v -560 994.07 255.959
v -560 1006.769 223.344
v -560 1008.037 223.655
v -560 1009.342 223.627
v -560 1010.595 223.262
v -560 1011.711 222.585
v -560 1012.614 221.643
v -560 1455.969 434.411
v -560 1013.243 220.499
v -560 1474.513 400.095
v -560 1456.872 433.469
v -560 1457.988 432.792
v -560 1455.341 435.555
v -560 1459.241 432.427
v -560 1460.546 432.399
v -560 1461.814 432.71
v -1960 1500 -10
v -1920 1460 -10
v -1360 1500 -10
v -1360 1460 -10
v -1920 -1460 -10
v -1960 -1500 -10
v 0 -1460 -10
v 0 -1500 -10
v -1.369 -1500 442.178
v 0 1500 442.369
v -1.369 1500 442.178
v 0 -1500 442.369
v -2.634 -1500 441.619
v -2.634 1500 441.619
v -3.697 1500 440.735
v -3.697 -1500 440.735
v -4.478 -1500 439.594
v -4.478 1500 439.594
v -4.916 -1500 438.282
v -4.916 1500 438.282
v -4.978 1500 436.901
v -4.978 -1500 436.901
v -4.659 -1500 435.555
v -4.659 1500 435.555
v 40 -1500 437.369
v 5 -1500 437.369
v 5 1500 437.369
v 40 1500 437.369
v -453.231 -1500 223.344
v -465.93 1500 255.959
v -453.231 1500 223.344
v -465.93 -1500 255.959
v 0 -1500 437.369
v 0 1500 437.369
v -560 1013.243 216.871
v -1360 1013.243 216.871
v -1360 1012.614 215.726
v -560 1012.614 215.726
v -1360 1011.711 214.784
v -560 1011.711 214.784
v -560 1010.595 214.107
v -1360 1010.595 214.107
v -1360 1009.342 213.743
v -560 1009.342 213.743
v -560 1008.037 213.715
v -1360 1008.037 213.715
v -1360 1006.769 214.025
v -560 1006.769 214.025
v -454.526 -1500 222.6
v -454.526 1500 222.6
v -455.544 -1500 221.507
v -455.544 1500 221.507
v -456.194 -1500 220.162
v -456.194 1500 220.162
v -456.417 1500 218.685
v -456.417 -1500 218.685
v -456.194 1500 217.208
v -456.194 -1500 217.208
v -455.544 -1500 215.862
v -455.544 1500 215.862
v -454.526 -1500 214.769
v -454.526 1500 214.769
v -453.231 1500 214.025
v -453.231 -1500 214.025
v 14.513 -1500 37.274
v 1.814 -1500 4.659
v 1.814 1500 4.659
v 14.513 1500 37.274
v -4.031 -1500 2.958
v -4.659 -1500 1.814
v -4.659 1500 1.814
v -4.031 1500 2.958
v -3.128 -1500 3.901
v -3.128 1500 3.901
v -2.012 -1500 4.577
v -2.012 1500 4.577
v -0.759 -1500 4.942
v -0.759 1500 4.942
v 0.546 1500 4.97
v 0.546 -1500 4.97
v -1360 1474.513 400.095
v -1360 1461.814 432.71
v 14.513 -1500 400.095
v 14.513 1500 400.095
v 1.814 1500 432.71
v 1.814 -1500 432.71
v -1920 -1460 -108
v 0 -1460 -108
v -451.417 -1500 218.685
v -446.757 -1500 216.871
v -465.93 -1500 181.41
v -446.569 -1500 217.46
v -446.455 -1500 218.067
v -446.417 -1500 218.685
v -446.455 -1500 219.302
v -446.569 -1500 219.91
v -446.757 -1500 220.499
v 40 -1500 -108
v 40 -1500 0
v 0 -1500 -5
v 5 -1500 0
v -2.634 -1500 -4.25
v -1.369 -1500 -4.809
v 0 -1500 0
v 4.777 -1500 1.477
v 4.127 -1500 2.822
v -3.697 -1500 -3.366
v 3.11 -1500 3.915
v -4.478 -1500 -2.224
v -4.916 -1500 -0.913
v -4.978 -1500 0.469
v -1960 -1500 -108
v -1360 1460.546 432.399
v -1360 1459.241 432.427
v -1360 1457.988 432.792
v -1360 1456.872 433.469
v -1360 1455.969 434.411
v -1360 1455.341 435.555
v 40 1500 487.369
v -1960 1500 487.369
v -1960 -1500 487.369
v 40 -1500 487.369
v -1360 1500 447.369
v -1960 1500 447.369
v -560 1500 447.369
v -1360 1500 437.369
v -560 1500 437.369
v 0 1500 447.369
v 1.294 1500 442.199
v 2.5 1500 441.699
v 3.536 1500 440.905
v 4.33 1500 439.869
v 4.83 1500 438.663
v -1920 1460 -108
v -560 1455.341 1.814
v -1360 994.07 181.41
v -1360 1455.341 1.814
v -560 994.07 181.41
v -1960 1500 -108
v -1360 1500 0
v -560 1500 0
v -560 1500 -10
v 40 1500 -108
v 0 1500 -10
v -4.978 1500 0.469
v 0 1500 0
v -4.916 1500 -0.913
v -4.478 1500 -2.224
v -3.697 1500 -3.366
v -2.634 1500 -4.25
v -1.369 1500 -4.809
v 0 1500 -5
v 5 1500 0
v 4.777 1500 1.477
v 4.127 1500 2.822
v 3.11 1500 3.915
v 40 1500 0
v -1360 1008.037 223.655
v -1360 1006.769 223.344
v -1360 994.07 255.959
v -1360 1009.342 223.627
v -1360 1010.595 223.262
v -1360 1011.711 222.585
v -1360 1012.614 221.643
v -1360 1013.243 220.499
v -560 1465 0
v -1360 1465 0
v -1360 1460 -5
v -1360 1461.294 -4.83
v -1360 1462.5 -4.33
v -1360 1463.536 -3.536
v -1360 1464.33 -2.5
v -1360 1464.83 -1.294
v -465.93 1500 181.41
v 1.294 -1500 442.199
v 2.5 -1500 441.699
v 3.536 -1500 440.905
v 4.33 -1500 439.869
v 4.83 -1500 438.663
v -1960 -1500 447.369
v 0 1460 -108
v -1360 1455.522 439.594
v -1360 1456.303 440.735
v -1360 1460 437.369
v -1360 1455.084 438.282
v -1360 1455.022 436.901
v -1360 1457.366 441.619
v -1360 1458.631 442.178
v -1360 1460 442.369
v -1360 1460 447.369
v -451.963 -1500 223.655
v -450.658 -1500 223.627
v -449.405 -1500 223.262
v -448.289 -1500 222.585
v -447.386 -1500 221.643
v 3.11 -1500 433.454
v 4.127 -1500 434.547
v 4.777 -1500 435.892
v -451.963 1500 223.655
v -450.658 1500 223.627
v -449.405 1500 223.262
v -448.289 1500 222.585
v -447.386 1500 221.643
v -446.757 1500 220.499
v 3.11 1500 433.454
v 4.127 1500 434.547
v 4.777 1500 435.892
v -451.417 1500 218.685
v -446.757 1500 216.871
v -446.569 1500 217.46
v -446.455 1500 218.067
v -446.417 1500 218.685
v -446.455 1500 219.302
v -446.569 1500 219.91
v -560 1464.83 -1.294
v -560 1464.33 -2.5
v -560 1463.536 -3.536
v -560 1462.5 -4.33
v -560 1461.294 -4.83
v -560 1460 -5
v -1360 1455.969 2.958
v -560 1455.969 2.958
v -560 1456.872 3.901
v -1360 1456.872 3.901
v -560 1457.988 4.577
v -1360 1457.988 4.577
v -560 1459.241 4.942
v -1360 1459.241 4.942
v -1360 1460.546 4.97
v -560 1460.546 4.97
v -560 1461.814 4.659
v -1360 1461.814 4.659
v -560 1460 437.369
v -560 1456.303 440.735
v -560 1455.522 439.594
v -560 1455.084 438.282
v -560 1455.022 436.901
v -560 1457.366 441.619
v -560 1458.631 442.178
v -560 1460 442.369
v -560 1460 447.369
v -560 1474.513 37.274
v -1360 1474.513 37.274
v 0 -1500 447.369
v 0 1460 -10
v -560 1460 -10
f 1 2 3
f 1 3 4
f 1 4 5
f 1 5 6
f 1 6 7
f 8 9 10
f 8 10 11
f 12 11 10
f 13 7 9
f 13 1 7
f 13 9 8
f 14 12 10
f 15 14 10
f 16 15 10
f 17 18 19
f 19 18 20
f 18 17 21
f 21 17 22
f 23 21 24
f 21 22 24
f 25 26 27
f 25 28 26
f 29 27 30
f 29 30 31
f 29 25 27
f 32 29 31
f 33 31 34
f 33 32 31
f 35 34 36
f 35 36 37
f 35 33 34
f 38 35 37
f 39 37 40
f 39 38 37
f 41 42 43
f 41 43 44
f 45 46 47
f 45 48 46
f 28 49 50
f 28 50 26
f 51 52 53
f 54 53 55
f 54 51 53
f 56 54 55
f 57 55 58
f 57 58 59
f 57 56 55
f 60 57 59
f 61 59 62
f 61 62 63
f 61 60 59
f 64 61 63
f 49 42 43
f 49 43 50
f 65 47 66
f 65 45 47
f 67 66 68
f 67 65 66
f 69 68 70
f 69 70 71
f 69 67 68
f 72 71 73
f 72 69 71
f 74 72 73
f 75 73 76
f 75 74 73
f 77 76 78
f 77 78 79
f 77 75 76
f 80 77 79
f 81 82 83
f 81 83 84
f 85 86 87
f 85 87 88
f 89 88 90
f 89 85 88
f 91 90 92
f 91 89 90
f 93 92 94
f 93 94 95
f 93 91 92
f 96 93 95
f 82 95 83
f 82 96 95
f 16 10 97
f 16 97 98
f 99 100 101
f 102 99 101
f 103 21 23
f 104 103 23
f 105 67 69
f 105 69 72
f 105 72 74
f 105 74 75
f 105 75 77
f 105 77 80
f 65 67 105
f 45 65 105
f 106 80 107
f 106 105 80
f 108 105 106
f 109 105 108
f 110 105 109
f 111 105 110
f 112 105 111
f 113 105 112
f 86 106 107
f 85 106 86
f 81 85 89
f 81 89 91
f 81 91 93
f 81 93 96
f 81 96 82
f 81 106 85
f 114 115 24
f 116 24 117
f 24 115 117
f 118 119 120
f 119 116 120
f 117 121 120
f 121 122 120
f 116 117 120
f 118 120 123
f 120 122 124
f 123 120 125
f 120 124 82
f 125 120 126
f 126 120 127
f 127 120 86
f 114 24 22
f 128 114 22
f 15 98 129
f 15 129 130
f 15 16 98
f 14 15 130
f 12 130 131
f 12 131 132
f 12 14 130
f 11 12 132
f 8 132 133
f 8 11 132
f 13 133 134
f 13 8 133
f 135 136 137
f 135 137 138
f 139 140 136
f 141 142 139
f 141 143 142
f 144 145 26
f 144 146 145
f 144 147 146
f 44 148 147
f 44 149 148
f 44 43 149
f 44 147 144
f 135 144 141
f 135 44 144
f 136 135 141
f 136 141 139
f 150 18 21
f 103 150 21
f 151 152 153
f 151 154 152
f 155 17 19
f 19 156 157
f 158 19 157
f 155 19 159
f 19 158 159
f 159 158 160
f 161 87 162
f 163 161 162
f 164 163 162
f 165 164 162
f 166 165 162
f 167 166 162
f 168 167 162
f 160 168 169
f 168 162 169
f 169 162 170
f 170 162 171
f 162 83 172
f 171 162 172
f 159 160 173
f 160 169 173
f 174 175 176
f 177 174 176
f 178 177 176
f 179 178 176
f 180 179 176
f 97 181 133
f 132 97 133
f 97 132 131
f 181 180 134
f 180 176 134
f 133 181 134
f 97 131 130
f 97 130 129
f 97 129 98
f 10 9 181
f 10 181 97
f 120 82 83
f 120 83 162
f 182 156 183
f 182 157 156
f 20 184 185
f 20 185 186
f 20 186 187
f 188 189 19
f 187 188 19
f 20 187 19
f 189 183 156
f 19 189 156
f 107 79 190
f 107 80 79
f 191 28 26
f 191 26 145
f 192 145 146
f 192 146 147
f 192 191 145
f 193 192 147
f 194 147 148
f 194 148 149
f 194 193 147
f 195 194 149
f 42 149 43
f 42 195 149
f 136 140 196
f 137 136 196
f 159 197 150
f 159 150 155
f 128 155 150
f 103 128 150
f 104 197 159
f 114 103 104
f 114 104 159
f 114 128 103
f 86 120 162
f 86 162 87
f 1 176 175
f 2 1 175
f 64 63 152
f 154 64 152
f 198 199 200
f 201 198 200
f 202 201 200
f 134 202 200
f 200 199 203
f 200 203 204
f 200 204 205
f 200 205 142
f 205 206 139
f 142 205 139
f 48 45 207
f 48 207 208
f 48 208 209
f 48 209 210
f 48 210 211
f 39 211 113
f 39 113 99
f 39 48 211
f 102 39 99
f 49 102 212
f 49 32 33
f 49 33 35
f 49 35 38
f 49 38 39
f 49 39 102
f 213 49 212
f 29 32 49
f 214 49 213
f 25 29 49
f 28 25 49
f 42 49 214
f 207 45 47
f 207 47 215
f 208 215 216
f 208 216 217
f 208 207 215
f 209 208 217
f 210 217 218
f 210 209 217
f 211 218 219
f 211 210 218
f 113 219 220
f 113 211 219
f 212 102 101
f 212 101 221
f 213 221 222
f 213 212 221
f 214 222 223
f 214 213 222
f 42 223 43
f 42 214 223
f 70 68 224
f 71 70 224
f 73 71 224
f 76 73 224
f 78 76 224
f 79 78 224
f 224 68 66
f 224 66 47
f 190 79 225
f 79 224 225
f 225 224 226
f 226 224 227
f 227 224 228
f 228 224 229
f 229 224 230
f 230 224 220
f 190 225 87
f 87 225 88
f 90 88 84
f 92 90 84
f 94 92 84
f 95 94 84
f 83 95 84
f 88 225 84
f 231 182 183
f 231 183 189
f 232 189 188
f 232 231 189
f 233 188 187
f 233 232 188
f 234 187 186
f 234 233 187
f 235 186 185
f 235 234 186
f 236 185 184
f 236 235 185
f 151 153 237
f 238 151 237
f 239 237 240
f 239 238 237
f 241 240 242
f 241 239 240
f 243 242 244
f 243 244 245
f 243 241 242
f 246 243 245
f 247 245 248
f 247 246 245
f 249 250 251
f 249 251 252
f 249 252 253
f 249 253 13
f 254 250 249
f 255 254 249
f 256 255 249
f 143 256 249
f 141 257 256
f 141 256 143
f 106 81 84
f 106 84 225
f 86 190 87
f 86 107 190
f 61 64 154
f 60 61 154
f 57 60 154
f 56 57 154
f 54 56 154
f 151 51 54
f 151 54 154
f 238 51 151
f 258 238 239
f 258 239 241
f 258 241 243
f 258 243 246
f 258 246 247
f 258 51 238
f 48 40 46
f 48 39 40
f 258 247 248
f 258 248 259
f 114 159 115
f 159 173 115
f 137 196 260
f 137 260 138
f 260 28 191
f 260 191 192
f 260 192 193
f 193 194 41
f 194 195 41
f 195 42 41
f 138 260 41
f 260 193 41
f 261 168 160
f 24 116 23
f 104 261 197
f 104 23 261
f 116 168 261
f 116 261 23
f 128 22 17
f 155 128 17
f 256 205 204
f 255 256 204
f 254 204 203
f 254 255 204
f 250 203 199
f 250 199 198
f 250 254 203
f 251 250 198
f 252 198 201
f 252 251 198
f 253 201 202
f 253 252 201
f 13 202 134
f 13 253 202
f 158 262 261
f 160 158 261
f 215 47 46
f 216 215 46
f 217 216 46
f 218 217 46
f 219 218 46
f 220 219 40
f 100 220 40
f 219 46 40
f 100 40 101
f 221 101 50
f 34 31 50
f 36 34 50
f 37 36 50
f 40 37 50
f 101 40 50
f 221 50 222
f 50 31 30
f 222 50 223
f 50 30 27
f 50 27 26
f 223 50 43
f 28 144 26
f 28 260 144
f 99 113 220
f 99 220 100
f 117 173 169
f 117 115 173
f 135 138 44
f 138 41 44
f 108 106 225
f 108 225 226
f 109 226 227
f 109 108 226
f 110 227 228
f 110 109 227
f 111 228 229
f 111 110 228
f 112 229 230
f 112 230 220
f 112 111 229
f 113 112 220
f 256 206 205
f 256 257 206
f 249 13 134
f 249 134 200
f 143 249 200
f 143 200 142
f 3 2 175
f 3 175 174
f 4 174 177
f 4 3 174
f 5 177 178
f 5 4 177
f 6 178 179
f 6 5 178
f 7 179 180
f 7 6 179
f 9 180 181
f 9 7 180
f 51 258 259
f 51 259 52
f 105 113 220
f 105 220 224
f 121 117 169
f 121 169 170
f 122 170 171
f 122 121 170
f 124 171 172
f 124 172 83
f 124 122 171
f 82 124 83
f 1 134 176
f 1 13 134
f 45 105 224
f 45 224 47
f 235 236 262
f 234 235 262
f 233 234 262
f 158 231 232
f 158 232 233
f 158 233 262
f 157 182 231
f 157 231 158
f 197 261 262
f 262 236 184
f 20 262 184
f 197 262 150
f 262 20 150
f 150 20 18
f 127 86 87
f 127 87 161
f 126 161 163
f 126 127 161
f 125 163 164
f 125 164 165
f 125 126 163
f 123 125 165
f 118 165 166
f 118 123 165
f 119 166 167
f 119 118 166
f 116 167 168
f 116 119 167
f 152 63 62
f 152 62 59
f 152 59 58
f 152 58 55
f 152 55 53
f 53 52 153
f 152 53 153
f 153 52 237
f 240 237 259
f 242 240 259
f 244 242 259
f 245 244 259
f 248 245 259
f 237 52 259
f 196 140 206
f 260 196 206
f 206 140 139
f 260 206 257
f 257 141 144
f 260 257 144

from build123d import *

# Parameters (mm, degrees)
F1_DEPTH = 1500
F2_W     = 1920
F2_H     = 2920
F3_DEPTH = 40
F5_DEPTH = 98
F9_DEPTH = 400


with BuildPart() as f1:
    # F0 (on Front) → F1 (new body, symmetric)
    with BuildSketch(Plane.XZ):
        with BuildLine():
            Line((0, 447.3692746821), (0, 442.3692746821))
            ThreePointArc((0, 442.3692746821), (3.5355339059, 440.904808588), (5, 437.3692746821))
            Line((5, 437.3692746821), (40, 437.3692746821))
            Line((40, 437.3692746821), (40, 447.3692746821))
            Line((40, 447.3692746821), (0, 447.3692746821))
        make_face()
    extrude(amount=F1_DEPTH, both=True)

    # F2 (on face) → F3 (join)
    with BuildSketch(Plane.XY.offset(447.3692746821)):
        Polygon((0, 1460), (0, 1500), (-1960, 1500), (-1960, -1500), (0, -1500), (0, -1460), (-1920, -1460), (-1920, 1460), align=None)
        Polygon((40, -1500), (40, 1500), (0, 1500), (0, 1460), (0, -1460), (0, -1500), align=None)
        with Locations((-960, 0)):
            Rectangle(F2_W, F2_H)
    extrude(amount=F3_DEPTH)



with BuildPart() as f1b:
    # F0 (on Front) → F1, piece 2 (new body, symmetric)
    with BuildSketch(Plane.XZ):
        with BuildLine():
            Line((-465.9295136291, 255.9589984314), (-453.2307942915, 223.3439324773))
            ThreePointArc((-453.2307942915, 223.3439324773), (-449.4048367078, 223.2620208926), (-446.7573963927, 220.4987401035))
            Line((-446.7573963927, 220.4987401035), (14.5128221001, 400.0949135917))
            Line((14.5128221001, 400.0949135917), (1.8141027625, 432.7099795458))
            ThreePointArc((1.8141027625, 432.7099795458), (-2.0118548213, 432.7918911305), (-4.6592951363, 435.5551719196))
            Line((-4.6592951363, 435.5551719196), (-465.9295136291, 255.9589984314))
        make_face()
        with BuildLine():
            Line((0, 437.3692746821), (1.8141027625, 432.7099795458))
            ThreePointArc((1.8141027625, 432.7099795458), (4.127378939, 434.5470870388), (5, 437.3692746821))
            Line((5, 437.3692746821), (0, 437.3692746821))
        make_face()
        with BuildLine():
            Line((0, 437.3692746821), (-4.6592951363, 435.5551719196))
            ThreePointArc((-4.6592951363, 435.5551719196), (-2.0118548213, 432.7918911305), (1.8141027625, 432.7099795458))
            Line((1.8141027625, 432.7099795458), (0, 437.3692746821))
        make_face()
        with BuildLine():
            ThreePointArc((0, 442.3692746821), (-4.127378939, 440.1914623253), (-4.6592951363, 435.5551719196))
            Line((-4.6592951363, 435.5551719196), (0, 437.3692746821))
            Line((0, 437.3692746821), (0, 442.3692746821))
        make_face()
    extrude(amount=F1_DEPTH, both=True)


with BuildPart() as f1c:
    # F0 (on Front) → F1, piece 3 (new body, symmetric)
    with BuildSketch(Plane.XZ):
        with BuildLine():
            Line((-465.9295136291, 181.4102762507), (-4.6592951363, 1.8141027625))
            ThreePointArc((-4.6592951363, 1.8141027625), (-2.0118548213, 4.5773835516), (1.8141027625, 4.6592951363))
            Line((1.8141027625, 4.6592951363), (14.5128221001, 37.2743610903))
            Line((14.5128221001, 37.2743610903), (-446.7573963927, 216.8705345785))
            ThreePointArc((-446.7573963927, 216.8705345785), (-449.4048367078, 214.1072537895), (-453.2307942915, 214.0253422047))
            Line((-453.2307942915, 214.0253422047), (-465.9295136291, 181.4102762507))
        make_face()
        with BuildLine():
            Line((-451.416691529, 218.684637341), (-453.2307942915, 214.0253422047))
            ThreePointArc((-453.2307942915, 214.0253422047), (-449.4048367078, 214.1072537895), (-446.7573963927, 216.8705345785))
            Line((-446.7573963927, 216.8705345785), (-451.416691529, 218.684637341))
        make_face()
        with BuildLine():
            Line((-451.416691529, 218.684637341), (-446.7573963927, 216.8705345785))
            ThreePointArc((-446.7573963927, 216.8705345785), (-446.5026058724, 217.761727725), (-446.416691529, 218.684637341))
            ThreePointArc((-446.416691529, 218.684637341), (-446.5026058724, 219.607546957), (-446.7573963927, 220.4987401035))
            Line((-446.7573963927, 220.4987401035), (-451.416691529, 218.684637341))
        make_face()
        with BuildLine():
            ThreePointArc((-453.2307942915, 223.3439324773), (-456.416691529, 218.684637341), (-453.2307942915, 214.0253422047))
            Line((-453.2307942915, 214.0253422047), (-451.416691529, 218.684637341))
            Line((-451.416691529, 218.684637341), (-453.2307942915, 223.3439324773))
        make_face()
    extrude(amount=F1_DEPTH, both=True)


with BuildPart() as f1d:
    # F0 (on Front) → F1, piece 4 (new body, symmetric)
    with BuildSketch(Plane.XZ):
        with BuildLine():
            Line((40, 0), (5, 0))
            ThreePointArc((5, 0), (3.5355339059, -3.5355339059), (0, -5))
            Line((0, -5), (0, -10))
            Line((0, -10), (40, -10))
            Line((40, -10), (40, 0))
        make_face()
        with BuildLine():
            Line((5, 0), (0, 0))
            Line((0, 0), (0, -5))
            ThreePointArc((0, -5), (3.5355339059, -3.5355339059), (5, 0))
        make_face()
        with BuildLine():
            Line((1.8141027625, 4.6592951363), (0, 0))
            Line((0, 0), (5, 0))
            ThreePointArc((5, 0), (4.127378939, 2.8221876433), (1.8141027625, 4.6592951363))
        make_face()
        with BuildLine():
            Line((0, -5), (0, 0))
            Line((0, 0), (-4.6592951363, 1.8141027625))
            ThreePointArc((-4.6592951363, 1.8141027625), (-4.127378939, -2.8221876433), (0, -5))
        make_face()
    extrude(amount=F1_DEPTH, both=True)

    # F4 (on face) → F5 (join)
    with BuildSketch(Plane(origin=(0, 0, -10), x_dir=(1, 0, 0), z_dir=(0, 0, -1))):
        Polygon((0, 1460), (0, 1500), (-1960, 1500), (-1960, -1500), (0, -1500), (0, -1460), (-1920, -1460), (-1920, 1460), align=None)
        Polygon((40, -1500), (40, 1500), (0, 1500), (0, 1460), (0, -1460), (0, -1500), align=None)
    extrude(amount=F5_DEPTH)

    # F8 (on plane+point) → F9, piece 4 (join, symmetric)
    with BuildSketch(Plane.YZ.offset(-960)):
        with BuildLine():
            Line((1500, 0), (1465, 0))
            ThreePointArc((1465, 0), (1463.5355339059, -3.5355339059), (1460, -5))
            Line((1460, -5), (1460, -10))
            Line((1460, -10), (1500, -10))
            Line((1500, -10), (1500, 0))
        make_face()
    extrude(amount=F9_DEPTH, both=True)


with BuildPart() as f9:
    # F8 (on plane+point) → F9 (new body, symmetric)
    with BuildSketch(Plane.YZ.offset(-960)):
        with BuildLine():
            Line((994.0704863709, 255.9589984314), (1006.7692057085, 223.3439324773))
            ThreePointArc((1006.7692057085, 223.3439324773), (1010.5951632922, 223.2620208926), (1013.2426036073, 220.4987401035))
            Line((1013.2426036073, 220.4987401035), (1474.5128221001, 400.0949135917))
            Line((1474.5128221001, 400.0949135917), (1461.8141027625, 432.7099795458))
            ThreePointArc((1461.8141027625, 432.7099795458), (1457.9881451787, 432.7918911305), (1455.3407048637, 435.5551719196))
            Line((1455.3407048637, 435.5551719196), (994.0704863709, 255.9589984314))
        make_face()
    extrude(amount=F9_DEPTH, both=True)


with BuildPart() as f9b:
    # F8 (on plane+point) → F9, piece 2 (new body, symmetric)
    with BuildSketch(Plane.YZ.offset(-960)):
        with BuildLine():
            Line((994.0704863709, 181.4102762507), (1455.3407048637, 1.8141027625))
            ThreePointArc((1455.3407048637, 1.8141027625), (1457.9881451787, 4.5773835516), (1461.8141027625, 4.6592951363))
            Line((1461.8141027625, 4.6592951363), (1474.5128221001, 37.2743610903))
            Line((1474.5128221001, 37.2743610903), (1013.2426036073, 216.8705345785))
            ThreePointArc((1013.2426036073, 216.8705345785), (1010.5951632922, 214.1072537895), (1006.7692057085, 214.0253422047))
            Line((1006.7692057085, 214.0253422047), (994.0704863709, 181.4102762507))
        make_face()
    extrude(amount=F9_DEPTH, both=True)


with BuildPart() as f1_1:
    add(f1.part)

    add(f9.part)  # F9#3 merges F9
    # F8 (on plane+point) → F9, piece 3 (join, symmetric)
    with BuildSketch(Plane.YZ.offset(-960)):
        with BuildLine():
            Line((1460, 447.3692746821), (1460, 442.3692746821))
            ThreePointArc((1460, 442.3692746821), (1463.5355339059, 440.904808588), (1465, 437.3692746821))
            Line((1465, 437.3692746821), (1500, 437.3692746821))
            Line((1500, 437.3692746821), (1500, 447.3692746821))
            Line((1500, 447.3692746821), (1460, 447.3692746821))
        make_face()
        with BuildLine():
            Line((1460, 442.3692746821), (1460, 437.3692746821))
            Line((1460, 437.3692746821), (1465, 437.3692746821))
            ThreePointArc((1465, 437.3692746821), (1463.5355339059, 440.904808588), (1460, 442.3692746821))
        make_face()
        with BuildLine():
            ThreePointArc((1460, 442.3692746821), (1455.872621061, 440.1914623253), (1455.3407048637, 435.5551719196))
            Line((1455.3407048637, 435.5551719196), (1460, 437.3692746821))
            Line((1460, 437.3692746821), (1460, 442.3692746821))
        make_face()
    extrude(amount=F9_DEPTH, both=True)


solid = Compound([f1b.part, f1c.part, f1d.part, f9b.part, f1_1.part])
